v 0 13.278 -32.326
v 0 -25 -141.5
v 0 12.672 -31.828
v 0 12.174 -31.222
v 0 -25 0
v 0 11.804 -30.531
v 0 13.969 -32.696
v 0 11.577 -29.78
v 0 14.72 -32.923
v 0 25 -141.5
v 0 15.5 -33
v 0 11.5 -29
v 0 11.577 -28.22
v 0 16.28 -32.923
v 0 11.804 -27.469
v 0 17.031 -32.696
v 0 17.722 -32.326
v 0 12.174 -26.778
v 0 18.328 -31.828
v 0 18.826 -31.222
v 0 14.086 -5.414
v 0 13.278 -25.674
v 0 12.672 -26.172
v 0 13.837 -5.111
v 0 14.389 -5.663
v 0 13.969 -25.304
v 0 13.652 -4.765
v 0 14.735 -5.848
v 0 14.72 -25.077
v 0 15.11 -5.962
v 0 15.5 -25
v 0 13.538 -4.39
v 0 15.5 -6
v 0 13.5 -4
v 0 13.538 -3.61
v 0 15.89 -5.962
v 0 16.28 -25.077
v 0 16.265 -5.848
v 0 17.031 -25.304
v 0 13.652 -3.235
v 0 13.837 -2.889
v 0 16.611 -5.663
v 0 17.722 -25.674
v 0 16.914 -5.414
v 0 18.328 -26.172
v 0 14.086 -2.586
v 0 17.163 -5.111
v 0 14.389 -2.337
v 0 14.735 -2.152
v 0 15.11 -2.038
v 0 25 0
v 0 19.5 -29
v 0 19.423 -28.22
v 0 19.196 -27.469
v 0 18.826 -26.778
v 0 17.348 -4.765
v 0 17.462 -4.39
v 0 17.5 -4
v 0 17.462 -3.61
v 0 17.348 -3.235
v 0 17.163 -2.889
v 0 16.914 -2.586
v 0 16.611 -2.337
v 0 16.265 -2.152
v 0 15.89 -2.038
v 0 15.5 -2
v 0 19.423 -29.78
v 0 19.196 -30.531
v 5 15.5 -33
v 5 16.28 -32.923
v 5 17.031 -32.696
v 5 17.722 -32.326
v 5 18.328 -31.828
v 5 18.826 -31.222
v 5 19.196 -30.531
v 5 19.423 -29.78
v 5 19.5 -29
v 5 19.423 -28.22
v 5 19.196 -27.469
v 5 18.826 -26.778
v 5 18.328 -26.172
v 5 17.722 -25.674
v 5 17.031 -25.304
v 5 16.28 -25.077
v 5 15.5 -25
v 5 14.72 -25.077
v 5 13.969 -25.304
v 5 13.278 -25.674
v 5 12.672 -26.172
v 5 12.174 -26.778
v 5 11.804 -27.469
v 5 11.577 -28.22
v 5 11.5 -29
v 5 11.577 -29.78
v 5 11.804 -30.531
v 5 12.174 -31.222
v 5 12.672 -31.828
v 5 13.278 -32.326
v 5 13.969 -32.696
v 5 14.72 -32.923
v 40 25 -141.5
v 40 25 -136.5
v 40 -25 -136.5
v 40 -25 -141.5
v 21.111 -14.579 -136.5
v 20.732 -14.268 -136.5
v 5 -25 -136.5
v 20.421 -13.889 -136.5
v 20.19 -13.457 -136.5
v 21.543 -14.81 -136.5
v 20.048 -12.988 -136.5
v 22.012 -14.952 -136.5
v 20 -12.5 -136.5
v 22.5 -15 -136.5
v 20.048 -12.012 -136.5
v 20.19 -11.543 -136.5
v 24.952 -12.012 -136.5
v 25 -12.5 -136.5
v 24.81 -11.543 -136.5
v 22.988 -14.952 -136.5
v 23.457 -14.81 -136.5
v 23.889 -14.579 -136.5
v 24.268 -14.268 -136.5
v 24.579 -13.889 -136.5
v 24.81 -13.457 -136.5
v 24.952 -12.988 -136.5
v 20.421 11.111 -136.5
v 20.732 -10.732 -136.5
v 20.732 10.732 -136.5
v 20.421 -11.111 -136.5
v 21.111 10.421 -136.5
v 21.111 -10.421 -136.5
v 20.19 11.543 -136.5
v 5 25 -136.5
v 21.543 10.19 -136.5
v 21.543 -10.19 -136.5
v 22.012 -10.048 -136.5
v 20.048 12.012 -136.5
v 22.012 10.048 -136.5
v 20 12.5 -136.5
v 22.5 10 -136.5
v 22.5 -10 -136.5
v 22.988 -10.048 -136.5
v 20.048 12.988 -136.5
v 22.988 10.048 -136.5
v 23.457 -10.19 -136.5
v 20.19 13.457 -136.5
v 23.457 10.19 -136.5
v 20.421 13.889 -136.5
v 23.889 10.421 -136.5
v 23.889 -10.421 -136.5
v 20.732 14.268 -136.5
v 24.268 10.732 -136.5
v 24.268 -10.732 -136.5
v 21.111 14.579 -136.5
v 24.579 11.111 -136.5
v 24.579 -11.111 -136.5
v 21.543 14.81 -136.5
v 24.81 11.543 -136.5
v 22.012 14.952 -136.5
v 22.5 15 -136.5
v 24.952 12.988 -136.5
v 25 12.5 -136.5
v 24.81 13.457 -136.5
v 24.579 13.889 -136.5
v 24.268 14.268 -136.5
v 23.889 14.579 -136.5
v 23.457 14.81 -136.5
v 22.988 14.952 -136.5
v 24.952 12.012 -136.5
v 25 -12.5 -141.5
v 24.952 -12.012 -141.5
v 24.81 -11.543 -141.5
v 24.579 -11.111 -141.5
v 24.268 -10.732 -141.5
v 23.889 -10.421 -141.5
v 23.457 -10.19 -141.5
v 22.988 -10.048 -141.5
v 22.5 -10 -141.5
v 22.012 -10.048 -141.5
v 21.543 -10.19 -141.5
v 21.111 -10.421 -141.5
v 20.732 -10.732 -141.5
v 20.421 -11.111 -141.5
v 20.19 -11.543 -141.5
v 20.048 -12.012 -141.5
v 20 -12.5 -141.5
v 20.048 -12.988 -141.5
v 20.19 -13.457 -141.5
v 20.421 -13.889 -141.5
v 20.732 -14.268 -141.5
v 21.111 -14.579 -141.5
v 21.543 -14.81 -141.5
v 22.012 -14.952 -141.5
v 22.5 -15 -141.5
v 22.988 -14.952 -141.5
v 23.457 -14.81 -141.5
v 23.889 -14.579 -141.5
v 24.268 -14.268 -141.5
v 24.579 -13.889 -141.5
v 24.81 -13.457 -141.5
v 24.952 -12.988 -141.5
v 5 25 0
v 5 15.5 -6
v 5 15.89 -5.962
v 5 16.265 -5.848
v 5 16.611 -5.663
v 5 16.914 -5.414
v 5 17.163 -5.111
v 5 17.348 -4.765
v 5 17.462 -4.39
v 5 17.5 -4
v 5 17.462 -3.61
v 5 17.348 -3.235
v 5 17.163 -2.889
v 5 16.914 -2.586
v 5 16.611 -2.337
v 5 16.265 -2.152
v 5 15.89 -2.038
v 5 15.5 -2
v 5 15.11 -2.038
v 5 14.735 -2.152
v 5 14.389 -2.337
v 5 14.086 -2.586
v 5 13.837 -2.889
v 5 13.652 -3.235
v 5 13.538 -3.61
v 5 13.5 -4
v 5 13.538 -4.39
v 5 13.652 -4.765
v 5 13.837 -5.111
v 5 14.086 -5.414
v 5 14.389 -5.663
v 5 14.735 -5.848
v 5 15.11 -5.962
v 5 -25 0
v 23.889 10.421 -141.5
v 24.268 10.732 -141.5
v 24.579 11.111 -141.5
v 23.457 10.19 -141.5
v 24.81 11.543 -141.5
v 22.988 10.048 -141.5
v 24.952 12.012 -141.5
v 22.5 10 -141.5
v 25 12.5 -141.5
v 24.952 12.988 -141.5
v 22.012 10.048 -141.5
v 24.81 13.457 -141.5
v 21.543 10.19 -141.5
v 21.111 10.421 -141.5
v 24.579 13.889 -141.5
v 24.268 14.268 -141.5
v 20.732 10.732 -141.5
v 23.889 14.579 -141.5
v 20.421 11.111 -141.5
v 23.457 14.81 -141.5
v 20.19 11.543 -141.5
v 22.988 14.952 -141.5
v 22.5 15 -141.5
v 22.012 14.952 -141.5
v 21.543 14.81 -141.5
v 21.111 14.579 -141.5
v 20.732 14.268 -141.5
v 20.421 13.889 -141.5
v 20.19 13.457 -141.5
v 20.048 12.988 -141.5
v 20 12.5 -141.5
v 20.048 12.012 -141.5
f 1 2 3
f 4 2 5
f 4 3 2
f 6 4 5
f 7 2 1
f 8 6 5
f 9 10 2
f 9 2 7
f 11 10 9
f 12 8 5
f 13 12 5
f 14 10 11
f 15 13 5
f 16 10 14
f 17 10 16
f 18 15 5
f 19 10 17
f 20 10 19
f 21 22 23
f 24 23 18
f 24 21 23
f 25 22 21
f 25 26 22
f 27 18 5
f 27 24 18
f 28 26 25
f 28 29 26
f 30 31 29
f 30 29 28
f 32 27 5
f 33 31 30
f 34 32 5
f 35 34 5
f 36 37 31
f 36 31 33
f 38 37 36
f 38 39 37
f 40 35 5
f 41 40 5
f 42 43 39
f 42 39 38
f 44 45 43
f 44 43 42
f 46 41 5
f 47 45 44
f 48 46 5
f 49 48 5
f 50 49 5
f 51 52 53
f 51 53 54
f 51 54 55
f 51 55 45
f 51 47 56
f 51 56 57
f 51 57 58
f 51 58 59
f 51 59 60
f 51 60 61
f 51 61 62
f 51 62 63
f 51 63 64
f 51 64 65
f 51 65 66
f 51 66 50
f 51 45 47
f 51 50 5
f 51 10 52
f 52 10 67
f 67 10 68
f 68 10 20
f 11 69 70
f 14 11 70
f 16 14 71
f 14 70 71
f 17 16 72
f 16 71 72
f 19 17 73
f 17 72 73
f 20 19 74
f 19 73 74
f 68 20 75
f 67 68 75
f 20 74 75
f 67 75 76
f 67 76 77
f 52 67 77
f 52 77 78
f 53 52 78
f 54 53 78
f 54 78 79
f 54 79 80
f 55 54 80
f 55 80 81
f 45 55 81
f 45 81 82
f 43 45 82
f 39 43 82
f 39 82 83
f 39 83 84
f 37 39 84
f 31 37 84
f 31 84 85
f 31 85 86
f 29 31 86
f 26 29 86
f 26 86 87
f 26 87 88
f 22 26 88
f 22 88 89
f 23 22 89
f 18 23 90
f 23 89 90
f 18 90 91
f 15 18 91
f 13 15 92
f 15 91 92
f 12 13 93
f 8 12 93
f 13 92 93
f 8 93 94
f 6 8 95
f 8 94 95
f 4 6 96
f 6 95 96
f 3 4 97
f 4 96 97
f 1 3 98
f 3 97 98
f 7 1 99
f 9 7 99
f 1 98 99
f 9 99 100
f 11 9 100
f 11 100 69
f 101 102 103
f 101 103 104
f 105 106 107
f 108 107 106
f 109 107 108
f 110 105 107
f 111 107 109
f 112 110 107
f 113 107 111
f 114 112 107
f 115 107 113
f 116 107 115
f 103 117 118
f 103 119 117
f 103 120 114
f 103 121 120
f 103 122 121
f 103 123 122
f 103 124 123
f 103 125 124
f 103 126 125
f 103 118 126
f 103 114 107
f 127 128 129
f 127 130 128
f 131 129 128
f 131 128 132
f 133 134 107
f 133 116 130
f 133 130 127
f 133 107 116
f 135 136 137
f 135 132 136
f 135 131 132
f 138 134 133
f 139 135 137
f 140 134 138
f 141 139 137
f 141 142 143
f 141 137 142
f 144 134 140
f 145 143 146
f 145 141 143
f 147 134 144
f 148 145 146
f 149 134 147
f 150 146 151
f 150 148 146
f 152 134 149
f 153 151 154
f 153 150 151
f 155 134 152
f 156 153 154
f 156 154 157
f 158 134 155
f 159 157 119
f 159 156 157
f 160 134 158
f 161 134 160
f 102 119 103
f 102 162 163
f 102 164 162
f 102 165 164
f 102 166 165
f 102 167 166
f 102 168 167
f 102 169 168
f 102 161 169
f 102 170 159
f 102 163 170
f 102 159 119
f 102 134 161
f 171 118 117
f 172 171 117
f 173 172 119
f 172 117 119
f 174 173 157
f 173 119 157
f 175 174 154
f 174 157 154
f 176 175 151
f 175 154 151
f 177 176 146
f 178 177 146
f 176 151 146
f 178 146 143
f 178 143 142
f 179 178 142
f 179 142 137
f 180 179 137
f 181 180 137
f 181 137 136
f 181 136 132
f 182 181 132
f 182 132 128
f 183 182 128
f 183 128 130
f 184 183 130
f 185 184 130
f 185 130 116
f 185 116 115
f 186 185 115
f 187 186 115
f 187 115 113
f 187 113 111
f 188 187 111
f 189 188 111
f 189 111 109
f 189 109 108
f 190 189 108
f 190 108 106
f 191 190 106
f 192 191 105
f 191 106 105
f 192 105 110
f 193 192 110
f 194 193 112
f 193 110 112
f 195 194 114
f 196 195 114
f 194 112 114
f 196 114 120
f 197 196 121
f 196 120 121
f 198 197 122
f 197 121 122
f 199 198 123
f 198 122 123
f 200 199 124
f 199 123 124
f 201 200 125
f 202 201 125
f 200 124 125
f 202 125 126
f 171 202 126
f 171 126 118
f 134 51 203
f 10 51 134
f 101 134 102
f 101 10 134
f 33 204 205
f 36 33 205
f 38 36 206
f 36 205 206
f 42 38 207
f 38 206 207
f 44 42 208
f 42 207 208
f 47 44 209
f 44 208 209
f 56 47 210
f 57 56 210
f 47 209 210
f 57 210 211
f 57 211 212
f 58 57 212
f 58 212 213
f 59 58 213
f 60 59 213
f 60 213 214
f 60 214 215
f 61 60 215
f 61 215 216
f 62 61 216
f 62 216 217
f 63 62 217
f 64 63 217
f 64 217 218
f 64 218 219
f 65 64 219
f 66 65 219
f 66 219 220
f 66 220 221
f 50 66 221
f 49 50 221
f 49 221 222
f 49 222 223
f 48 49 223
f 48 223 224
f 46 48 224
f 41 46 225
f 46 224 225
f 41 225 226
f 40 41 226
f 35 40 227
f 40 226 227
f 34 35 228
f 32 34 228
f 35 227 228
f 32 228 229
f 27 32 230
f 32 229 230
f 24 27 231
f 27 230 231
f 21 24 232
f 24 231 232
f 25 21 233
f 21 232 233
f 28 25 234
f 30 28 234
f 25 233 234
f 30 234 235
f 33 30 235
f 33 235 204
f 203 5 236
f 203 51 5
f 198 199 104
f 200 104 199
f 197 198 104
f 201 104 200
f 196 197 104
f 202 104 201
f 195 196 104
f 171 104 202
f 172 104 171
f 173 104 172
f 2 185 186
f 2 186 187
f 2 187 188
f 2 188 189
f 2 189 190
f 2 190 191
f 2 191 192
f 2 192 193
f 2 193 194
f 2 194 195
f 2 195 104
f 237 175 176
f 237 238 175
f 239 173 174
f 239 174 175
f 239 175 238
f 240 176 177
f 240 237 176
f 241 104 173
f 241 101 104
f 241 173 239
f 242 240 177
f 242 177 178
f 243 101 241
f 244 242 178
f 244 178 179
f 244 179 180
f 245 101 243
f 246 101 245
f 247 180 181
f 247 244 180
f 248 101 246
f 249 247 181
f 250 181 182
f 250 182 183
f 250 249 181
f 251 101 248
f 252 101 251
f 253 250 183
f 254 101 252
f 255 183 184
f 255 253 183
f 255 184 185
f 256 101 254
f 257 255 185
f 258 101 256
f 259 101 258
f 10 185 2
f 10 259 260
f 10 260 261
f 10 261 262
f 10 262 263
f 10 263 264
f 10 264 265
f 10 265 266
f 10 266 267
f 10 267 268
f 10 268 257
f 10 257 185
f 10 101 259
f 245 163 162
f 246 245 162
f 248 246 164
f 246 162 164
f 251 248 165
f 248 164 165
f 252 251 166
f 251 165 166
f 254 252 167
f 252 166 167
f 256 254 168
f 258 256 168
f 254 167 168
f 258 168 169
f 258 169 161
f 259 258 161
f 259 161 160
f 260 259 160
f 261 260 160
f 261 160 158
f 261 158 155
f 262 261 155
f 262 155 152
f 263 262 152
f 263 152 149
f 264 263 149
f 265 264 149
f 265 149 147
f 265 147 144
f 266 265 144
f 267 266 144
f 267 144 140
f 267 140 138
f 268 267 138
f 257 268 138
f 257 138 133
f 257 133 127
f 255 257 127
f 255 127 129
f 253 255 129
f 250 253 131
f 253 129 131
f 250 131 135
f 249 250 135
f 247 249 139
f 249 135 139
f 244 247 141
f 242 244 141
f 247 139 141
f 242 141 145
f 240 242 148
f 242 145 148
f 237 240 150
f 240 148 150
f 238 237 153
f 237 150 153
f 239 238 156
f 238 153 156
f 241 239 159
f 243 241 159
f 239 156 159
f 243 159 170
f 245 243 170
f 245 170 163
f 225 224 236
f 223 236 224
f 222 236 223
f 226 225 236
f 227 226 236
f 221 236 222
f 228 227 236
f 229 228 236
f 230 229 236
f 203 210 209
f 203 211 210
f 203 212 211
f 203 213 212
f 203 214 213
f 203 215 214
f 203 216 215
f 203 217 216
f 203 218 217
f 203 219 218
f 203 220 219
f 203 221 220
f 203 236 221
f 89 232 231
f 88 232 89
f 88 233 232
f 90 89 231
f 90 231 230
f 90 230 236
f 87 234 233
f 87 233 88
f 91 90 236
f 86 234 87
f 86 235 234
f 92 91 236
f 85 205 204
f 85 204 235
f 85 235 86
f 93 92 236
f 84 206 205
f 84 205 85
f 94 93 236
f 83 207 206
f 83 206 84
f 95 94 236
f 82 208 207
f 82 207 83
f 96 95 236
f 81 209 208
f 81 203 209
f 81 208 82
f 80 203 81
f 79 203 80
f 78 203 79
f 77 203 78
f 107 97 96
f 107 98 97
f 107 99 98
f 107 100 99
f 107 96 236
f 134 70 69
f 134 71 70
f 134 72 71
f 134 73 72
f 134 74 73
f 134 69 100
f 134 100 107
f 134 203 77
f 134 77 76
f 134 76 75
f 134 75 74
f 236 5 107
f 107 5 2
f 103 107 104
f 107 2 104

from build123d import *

# Parameters (mm, degrees)
BOSS_EXTRUDE2_DEPTH = 25
CUT_EXTRUDE2_REACH  = 149.893
SKETCH4_R           = 2
SKETCH4_R_2         = 4
CUT_EXTRUDE3_REACH  = 146.42
SKETCH5_R           = 2.5


with BuildPart() as part:
    # Sketch3 → Boss-Extrude2 (new, symmetric)
    with BuildSketch(Plane(origin=(0, 0, 0), x_dir=(1, 0, 0), z_dir=(0, 1, 0))):
        Polygon((0, 0), (5, 0), (5, 136.5), (40, 136.5), (40, 141.5), (0, 141.5), align=None)
    extrude(amount=BOSS_EXTRUDE2_DEPTH, both=True)

    # Sketch4 → Cut-Extrude2 (cut, up to next)
    with BuildSketch(Plane(origin=(5, 0, 0), x_dir=(0, 0, -1), z_dir=(1, 0, 0)), mode=Mode.PRIVATE) as cut_extrude2_sk1:
        with Locations((4, 15.5)):
            Circle(SKETCH4_R)
    cut_extrude2_tool1 = extrude(cut_extrude2_sk1.sketch, amount=-CUT_EXTRUDE2_REACH, mode=Mode.PRIVATE) & part.part
    # Sketch4 → Cut-Extrude2 (cut, up to next)
    with BuildSketch(Plane(origin=(5, 0, 0), x_dir=(0, 0, -1), z_dir=(1, 0, 0)), mode=Mode.PRIVATE) as cut_extrude2_sk2:
        with Locations((29, 15.5)):
            Circle(SKETCH4_R_2)
    cut_extrude2_tool2 = extrude(cut_extrude2_sk2.sketch, amount=-CUT_EXTRUDE2_REACH, mode=Mode.PRIVATE) & part.part
    add(cut_extrude2_tool1.solids().sort_by_distance((5, 15.5, -4))[0], mode=Mode.SUBTRACT)
    add(cut_extrude2_tool2.solids().sort_by_distance((5, 15.5, -29))[0], mode=Mode.SUBTRACT)

    # Sketch5 → Cut-Extrude3 (cut, up to next)
    with BuildSketch(Plane.XY.offset(-136.5), mode=Mode.PRIVATE) as cut_extrude3_sk1:
        with Locations((22.5, 12.5)):
            Circle(SKETCH5_R)
    cut_extrude3_tool1 = extrude(cut_extrude3_sk1.sketch, amount=-CUT_EXTRUDE3_REACH, mode=Mode.PRIVATE) & part.part
    # Sketch5 → Cut-Extrude3 (cut, up to next)
    with BuildSketch(Plane.XY.offset(-136.5), mode=Mode.PRIVATE) as cut_extrude3_sk2:
        with Locations((22.5, -12.5)):
            Circle(SKETCH5_R)
    cut_extrude3_tool2 = extrude(cut_extrude3_sk2.sketch, amount=-CUT_EXTRUDE3_REACH, mode=Mode.PRIVATE) & part.part
    add(cut_extrude3_tool1.solids().sort_by_distance((22.5, 12.5, -136.5))[0], mode=Mode.SUBTRACT)
    add(cut_extrude3_tool2.solids().sort_by_distance((22.5, -12.5, -136.5))[0], mode=Mode.SUBTRACT)


solid = part.part
